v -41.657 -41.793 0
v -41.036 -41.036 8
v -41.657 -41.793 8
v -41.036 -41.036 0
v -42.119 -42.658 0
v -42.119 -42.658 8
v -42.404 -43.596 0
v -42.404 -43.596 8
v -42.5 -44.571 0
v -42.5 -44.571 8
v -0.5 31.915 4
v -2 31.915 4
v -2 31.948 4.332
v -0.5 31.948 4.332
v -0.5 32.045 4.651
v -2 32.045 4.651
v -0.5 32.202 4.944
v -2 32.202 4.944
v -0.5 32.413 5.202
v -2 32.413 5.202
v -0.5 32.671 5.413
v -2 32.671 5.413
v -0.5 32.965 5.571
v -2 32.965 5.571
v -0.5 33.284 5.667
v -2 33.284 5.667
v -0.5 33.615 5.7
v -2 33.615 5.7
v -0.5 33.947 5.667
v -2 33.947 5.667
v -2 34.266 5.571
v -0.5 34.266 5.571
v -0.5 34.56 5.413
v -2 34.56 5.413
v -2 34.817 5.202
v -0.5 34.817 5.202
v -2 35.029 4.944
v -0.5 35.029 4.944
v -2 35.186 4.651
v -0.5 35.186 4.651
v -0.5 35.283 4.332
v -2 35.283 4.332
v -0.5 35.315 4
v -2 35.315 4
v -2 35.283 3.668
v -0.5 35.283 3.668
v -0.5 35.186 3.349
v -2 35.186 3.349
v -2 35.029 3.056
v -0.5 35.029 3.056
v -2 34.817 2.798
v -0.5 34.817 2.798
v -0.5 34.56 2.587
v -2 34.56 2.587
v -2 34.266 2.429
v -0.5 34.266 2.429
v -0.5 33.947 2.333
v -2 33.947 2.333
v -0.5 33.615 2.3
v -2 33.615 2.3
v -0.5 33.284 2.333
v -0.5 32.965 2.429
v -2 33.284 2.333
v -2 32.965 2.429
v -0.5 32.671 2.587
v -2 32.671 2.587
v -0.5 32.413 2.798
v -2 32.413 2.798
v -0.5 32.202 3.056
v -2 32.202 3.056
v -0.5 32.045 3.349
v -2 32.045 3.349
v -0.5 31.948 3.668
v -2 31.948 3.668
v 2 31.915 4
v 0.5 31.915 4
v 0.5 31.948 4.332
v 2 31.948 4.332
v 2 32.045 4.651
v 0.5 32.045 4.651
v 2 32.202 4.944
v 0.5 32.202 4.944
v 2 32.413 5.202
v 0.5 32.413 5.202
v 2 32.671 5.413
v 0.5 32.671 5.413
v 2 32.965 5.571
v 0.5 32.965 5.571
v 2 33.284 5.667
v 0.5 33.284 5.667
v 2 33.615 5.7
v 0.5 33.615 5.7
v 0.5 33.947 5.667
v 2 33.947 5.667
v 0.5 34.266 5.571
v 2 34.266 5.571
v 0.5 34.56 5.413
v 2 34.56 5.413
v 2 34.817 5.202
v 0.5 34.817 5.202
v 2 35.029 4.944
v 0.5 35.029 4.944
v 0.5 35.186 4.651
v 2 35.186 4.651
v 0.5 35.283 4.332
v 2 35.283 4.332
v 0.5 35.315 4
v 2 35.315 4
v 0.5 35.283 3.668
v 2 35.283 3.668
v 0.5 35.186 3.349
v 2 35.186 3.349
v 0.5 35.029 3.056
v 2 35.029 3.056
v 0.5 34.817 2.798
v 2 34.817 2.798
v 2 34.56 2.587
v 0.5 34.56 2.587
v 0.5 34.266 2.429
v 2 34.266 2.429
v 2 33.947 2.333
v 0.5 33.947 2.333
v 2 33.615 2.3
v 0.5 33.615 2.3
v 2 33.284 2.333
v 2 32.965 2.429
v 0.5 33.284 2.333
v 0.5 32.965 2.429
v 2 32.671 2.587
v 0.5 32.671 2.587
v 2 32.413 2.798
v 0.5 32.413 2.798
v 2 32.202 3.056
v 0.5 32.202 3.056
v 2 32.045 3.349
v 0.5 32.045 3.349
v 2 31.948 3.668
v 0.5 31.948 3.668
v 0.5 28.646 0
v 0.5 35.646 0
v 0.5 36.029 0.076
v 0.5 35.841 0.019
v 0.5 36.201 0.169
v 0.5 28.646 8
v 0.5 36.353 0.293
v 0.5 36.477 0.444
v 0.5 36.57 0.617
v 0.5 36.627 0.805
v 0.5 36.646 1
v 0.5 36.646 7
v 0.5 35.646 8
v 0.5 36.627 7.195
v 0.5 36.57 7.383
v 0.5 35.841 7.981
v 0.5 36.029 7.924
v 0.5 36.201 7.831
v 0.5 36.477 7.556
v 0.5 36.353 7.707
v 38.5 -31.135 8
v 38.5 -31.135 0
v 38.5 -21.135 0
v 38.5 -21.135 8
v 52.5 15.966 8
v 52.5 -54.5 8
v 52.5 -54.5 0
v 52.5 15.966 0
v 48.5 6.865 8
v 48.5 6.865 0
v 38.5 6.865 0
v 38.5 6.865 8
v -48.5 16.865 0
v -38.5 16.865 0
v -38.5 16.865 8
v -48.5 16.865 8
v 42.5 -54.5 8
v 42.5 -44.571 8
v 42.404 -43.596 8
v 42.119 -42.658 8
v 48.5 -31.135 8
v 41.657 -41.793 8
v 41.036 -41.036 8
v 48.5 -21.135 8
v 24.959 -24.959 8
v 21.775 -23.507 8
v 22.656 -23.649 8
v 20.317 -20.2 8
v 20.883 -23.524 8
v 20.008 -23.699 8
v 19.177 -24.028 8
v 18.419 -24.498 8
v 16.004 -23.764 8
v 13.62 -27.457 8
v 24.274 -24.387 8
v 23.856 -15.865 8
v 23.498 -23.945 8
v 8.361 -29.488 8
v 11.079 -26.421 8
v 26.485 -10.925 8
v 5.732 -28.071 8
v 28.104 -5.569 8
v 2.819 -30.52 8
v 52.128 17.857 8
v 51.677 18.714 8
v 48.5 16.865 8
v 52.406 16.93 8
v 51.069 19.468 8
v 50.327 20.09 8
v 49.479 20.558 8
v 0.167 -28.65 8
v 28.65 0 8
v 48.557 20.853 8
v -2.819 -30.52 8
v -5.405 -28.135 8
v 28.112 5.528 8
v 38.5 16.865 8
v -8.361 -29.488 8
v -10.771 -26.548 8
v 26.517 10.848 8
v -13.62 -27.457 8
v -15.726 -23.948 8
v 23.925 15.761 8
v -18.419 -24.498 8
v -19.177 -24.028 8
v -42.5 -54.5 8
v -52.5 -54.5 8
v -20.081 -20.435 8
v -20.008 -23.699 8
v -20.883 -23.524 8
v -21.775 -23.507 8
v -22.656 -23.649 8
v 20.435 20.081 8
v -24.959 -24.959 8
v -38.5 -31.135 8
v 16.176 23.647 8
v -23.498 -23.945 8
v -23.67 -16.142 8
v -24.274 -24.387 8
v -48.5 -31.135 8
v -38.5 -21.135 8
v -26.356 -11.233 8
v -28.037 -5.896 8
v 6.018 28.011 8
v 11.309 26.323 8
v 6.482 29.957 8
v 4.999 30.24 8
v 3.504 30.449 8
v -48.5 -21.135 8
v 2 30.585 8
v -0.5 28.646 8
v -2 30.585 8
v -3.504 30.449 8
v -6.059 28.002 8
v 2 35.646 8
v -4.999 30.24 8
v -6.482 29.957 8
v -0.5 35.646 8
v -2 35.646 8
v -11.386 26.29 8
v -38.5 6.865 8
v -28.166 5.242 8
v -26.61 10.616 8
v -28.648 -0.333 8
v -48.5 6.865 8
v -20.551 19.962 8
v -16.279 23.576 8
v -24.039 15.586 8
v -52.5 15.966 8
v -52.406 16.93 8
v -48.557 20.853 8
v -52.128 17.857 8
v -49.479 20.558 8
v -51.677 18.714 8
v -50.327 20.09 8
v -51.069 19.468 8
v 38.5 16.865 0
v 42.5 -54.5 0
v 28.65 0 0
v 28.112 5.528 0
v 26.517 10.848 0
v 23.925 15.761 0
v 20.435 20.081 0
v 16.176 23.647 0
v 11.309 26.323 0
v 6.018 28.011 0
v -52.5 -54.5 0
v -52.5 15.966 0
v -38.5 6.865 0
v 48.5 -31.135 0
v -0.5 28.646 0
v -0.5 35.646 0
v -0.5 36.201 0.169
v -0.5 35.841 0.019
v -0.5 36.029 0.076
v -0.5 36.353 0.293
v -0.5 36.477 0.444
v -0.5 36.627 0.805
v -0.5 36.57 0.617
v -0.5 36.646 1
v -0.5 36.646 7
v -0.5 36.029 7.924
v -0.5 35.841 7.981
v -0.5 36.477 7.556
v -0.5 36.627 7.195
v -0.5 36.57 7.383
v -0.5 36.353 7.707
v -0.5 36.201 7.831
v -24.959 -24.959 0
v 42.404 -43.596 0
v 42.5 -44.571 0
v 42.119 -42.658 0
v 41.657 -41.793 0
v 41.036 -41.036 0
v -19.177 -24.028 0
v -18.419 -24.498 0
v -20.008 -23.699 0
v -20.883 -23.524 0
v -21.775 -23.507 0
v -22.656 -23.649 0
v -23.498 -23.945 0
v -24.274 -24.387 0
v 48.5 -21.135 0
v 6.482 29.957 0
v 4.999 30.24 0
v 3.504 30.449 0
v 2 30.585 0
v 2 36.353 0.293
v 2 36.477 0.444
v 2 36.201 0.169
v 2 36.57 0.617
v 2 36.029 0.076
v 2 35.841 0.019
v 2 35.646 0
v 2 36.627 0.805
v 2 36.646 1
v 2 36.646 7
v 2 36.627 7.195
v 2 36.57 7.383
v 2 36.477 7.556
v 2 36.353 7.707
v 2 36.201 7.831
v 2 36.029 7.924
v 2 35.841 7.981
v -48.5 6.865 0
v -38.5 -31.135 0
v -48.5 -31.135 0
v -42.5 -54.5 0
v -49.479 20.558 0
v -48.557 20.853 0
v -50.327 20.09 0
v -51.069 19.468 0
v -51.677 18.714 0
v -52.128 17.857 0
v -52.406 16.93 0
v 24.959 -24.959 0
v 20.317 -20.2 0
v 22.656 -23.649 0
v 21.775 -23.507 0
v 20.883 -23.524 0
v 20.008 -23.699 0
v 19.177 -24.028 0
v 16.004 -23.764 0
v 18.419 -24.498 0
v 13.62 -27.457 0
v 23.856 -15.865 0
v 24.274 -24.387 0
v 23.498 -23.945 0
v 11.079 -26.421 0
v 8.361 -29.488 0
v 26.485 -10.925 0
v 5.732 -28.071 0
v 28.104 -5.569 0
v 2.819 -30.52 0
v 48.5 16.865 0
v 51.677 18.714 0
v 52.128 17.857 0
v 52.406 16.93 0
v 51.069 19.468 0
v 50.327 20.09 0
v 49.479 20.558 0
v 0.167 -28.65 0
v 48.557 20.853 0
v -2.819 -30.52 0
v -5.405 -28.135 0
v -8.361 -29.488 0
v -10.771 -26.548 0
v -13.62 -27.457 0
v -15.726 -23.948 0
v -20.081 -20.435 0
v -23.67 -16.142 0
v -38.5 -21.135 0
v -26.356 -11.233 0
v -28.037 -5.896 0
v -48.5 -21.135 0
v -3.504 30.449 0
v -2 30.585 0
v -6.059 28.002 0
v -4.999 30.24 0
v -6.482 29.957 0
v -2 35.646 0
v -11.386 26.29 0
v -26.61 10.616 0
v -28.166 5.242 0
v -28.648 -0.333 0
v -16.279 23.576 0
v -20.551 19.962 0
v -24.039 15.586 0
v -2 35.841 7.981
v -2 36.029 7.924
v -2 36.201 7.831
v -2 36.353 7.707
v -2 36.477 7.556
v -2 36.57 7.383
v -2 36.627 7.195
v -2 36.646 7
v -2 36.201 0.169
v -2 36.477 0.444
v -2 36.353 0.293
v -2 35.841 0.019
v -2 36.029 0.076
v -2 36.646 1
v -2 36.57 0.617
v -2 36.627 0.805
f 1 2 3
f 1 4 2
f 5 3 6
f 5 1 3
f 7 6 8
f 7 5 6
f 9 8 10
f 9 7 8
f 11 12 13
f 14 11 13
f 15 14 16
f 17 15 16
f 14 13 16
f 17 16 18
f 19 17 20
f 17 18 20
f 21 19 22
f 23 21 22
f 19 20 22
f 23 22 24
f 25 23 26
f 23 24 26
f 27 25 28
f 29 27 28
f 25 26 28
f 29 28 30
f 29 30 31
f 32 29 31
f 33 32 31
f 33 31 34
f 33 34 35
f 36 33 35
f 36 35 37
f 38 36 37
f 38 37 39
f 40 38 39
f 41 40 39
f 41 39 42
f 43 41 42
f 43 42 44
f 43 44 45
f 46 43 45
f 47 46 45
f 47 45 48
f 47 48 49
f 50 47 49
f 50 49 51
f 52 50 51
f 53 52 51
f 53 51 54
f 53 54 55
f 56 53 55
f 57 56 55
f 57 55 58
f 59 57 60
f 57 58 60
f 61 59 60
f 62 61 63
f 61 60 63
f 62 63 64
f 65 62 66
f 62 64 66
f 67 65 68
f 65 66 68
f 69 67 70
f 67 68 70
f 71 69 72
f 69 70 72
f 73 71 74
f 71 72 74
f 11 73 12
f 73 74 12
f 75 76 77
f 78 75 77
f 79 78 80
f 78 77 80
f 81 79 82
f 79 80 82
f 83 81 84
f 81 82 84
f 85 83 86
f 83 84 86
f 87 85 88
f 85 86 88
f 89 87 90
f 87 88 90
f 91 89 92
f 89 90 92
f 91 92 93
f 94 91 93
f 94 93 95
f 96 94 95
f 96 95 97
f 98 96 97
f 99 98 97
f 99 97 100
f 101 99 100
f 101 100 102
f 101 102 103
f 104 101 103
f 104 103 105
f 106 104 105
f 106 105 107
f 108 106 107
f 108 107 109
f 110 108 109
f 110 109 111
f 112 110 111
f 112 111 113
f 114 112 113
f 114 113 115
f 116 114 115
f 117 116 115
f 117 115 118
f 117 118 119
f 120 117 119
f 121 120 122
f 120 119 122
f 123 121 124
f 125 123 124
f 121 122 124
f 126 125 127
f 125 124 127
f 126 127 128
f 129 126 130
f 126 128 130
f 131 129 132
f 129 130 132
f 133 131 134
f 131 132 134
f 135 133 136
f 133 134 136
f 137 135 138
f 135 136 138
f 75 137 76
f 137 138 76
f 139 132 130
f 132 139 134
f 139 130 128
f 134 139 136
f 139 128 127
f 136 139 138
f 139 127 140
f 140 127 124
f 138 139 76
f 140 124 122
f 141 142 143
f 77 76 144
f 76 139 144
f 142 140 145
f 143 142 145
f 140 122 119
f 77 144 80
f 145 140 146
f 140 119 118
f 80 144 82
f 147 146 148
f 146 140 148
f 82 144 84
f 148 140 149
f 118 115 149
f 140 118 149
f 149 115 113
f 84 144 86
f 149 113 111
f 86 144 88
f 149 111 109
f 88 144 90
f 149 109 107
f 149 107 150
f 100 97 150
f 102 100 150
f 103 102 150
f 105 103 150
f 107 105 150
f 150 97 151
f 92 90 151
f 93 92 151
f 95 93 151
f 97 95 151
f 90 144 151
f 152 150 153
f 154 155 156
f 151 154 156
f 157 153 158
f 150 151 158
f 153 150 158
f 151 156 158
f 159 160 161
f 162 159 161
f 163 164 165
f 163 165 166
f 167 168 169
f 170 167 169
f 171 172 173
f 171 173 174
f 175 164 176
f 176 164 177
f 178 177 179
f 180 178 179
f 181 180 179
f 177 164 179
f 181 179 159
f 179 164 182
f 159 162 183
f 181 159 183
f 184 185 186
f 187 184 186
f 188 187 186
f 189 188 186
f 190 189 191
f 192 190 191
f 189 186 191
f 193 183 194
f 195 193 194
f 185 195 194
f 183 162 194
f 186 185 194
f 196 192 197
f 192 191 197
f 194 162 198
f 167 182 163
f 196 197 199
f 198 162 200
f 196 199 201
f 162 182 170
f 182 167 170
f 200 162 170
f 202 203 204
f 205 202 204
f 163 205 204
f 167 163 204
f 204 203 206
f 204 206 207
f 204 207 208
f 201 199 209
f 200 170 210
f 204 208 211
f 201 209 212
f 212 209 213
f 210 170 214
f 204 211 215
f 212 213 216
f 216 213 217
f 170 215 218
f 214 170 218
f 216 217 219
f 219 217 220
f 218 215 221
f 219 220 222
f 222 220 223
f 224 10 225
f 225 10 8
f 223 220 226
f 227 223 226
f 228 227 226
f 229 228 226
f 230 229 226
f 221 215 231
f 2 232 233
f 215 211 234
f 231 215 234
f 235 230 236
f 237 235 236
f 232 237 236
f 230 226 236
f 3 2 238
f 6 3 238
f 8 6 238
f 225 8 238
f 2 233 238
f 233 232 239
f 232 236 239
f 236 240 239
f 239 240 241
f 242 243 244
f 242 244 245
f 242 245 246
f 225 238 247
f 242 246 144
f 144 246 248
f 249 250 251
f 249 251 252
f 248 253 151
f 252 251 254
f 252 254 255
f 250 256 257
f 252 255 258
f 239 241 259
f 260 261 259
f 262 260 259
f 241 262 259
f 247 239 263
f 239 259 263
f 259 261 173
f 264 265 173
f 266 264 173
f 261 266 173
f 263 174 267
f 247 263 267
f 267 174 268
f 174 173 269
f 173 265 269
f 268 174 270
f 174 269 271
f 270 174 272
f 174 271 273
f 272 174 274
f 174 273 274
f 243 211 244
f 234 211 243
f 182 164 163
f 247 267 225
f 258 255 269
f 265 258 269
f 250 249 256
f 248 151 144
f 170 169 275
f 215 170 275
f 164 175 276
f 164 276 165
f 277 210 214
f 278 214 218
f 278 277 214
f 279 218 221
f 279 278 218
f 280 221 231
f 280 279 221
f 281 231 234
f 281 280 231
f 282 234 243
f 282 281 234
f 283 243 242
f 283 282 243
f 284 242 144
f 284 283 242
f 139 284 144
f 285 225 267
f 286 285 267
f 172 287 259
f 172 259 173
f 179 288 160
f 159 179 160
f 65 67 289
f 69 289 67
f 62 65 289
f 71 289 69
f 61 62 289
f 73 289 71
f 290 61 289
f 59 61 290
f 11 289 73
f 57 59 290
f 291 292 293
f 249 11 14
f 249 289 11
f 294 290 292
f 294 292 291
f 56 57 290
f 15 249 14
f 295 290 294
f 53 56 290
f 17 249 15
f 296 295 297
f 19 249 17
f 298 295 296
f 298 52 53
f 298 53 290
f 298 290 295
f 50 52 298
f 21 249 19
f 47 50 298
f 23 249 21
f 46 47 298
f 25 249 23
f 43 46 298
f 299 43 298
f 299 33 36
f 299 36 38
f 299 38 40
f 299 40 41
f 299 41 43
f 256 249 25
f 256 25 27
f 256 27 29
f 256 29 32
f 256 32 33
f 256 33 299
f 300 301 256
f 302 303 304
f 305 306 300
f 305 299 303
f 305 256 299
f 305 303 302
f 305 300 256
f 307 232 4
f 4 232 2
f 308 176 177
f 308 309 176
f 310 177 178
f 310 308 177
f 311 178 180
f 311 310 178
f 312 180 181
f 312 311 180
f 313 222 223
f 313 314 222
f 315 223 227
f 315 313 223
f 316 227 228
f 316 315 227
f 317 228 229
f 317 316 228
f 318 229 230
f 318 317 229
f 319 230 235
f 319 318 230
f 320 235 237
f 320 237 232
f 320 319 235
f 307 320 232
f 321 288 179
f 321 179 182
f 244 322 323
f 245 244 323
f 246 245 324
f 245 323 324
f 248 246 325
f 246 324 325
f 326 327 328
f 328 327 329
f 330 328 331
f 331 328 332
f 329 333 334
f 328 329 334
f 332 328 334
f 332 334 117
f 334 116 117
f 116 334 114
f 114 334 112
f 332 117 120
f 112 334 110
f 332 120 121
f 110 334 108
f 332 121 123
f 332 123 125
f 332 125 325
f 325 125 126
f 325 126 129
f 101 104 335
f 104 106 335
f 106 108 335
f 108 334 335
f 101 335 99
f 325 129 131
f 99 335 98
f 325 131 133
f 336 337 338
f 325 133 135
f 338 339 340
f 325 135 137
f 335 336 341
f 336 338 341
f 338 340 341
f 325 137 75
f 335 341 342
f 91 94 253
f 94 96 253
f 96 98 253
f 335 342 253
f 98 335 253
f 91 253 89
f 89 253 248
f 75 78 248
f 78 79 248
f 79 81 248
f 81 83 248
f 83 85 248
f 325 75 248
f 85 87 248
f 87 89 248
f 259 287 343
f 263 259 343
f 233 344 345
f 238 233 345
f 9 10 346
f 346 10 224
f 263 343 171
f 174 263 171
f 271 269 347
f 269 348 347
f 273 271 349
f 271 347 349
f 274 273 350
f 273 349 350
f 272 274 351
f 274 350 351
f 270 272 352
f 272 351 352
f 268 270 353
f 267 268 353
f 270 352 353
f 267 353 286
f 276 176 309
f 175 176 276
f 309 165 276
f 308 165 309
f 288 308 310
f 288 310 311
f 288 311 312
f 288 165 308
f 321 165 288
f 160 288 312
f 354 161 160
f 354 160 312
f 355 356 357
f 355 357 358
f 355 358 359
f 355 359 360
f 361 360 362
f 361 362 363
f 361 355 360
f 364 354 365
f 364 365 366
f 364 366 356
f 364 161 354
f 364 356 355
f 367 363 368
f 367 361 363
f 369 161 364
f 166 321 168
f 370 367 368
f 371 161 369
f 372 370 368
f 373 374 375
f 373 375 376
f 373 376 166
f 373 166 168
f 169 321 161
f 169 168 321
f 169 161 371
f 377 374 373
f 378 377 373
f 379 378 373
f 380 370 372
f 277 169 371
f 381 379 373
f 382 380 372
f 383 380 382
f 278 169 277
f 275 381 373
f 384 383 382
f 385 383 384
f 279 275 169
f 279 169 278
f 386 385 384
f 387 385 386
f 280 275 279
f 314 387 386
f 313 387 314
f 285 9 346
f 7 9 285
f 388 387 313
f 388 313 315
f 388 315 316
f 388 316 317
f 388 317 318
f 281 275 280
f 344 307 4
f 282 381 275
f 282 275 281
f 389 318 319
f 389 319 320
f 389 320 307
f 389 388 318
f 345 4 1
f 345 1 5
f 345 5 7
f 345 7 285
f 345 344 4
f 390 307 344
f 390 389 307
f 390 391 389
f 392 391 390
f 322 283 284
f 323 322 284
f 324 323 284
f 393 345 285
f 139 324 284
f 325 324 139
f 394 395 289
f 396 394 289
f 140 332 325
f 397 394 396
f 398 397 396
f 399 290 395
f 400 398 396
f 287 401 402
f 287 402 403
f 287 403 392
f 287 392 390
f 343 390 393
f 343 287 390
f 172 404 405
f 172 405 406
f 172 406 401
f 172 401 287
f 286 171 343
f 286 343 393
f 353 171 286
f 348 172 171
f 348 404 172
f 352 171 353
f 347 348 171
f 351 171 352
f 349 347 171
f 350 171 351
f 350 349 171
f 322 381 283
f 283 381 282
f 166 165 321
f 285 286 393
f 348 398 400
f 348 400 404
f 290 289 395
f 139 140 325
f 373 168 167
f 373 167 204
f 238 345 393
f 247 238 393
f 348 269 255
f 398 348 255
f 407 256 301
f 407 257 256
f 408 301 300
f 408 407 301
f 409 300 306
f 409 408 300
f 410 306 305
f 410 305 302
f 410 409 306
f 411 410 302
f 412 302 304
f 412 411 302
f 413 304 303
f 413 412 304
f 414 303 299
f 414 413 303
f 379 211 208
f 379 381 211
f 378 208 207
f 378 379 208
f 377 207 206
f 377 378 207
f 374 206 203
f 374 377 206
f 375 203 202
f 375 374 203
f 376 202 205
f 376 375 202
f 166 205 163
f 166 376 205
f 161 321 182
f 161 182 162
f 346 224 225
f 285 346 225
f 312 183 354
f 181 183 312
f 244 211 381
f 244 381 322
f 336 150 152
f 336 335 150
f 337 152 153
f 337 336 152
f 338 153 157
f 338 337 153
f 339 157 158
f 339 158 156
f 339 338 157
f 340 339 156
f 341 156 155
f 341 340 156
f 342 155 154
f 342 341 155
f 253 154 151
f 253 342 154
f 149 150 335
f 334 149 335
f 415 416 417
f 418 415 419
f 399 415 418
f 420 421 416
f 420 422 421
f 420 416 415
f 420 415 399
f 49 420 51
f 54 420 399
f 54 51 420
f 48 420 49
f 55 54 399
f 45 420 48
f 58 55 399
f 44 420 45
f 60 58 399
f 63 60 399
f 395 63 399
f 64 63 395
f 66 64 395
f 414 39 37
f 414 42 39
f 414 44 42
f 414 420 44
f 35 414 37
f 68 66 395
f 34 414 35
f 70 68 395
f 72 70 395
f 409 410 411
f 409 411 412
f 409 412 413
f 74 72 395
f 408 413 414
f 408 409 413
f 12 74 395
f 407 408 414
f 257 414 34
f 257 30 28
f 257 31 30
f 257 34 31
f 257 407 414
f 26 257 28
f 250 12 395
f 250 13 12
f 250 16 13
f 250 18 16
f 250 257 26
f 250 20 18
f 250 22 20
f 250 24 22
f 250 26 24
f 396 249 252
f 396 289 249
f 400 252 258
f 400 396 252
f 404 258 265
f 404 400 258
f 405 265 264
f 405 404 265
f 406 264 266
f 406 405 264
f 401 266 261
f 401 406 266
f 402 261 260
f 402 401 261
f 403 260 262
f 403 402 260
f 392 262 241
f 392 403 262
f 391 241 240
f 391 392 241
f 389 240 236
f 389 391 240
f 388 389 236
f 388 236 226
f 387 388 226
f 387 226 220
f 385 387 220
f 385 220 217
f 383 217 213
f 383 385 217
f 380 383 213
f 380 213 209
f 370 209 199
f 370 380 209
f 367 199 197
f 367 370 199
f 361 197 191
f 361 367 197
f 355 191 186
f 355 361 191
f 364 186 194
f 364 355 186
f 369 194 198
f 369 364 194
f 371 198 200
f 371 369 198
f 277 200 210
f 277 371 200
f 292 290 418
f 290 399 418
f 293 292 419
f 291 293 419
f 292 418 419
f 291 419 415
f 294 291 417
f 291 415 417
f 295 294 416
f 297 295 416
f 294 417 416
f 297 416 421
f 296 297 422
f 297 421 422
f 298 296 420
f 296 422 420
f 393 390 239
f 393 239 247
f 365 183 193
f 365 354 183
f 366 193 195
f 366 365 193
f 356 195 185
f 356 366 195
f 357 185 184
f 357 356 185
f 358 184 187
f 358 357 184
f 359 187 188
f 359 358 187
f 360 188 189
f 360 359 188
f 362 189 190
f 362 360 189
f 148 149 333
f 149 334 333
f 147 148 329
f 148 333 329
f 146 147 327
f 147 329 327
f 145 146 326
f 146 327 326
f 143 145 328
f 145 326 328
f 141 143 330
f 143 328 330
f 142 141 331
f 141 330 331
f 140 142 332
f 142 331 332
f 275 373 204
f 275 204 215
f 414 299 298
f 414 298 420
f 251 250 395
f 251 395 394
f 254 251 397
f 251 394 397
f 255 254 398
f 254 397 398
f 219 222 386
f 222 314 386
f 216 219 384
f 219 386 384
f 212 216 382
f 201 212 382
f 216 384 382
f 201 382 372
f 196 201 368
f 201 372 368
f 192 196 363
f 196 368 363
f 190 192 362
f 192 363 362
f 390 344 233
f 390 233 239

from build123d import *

# Parameters (mm, degrees)
SKIZZE1_R                       = 30.65
SKIZZE1_R_2                     = 28.65
AUFSATZ_LINEAR_AUSTRAGEN1_DEPTH = 8
AUFSATZ_LINEAR_AUSTRAGEN2_DEPTH = 8
SKIZZE3_W                       = 1
SKIZZE3_H                       = 2.855309686
SCHNITT_LINEAR_AUSTRAGEN1_DEPTH = 10
AUFSATZ_LINEAR_AUSTRAGEN3_DEPTH = 8
SKIZZE5_R                       = 1.7
SCHNITT_LINEAR_AUSTRAGEN2_DEPTH = 8
VERRUNDUNG2_R                   = 1
SKIZZE7_W                       = 10
SKIZZE7_H                       = 10
SCHNITT_LINEAR_AUSTRAGEN4_DEPTH = 10
VERRUNDUNG3_R                   = 5


with BuildPart() as part:
    # Skizze1 → Aufsatz-Linear austragen1 (new body)
    with BuildSketch(Plane.XY):
        Circle(SKIZZE1_R)
        Circle(SKIZZE1_R_2, mode=Mode.SUBTRACT)
    extrude(amount=AUFSATZ_LINEAR_AUSTRAGEN1_DEPTH)

    # Skizze2 → Aufsatz-Linear austragen2 (add)
    with BuildSketch(Plane.XY.offset(8)):
        with BuildLine():
            Line((42.5, -42.5), (42.5, -54.5))
            Line((42.5, -54.5), (52.5, -54.5))
            Line((52.5, -54.5), (52.5, 20))
            Line((52.5, 20), (6.481641536, 29.956815969))
            Line((6.481641536, 29.956815969), (6.460494255, 29.859077581))
            ThreePointArc((6.460494255, 29.859077581), (29.307694933, 8.623312455), (21.602112165, -21.602112165))
            Line((21.602112165, -21.602112165), (21.672822843, -21.672822843))
            Line((21.672822843, -21.672822843), (42.5, -42.5))
        make_face()
        with BuildLine():
            Line((-21.672822843, -21.672822843), (-42.5, -42.5))
            Line((-42.5, -42.5), (-42.5, -54.5))
            Line((-42.5, -54.5), (-52.5, -54.5))
            Line((-52.5, -54.5), (-52.5, 20))
            Line((-52.5, 20), (-6.481641536, 29.956815969))
            Line((-6.481641536, 29.956815969), (-6.460494255, 29.859077581))
            ThreePointArc((-6.460494255, 29.859077581), (-29.307694933, 8.623312455), (-21.602112165, -21.602112165))
            Line((-21.602112165, -21.602112165), (-21.672822843, -21.672822843))
        make_face()
    extrude(amount=-AUFSATZ_LINEAR_AUSTRAGEN2_DEPTH)

    # Skizze3 → Schnitt-Linear austragen1 (cut)
    with BuildSketch(Plane.XY.offset(8)):
        with Locations((0, 29.34103969)):
            Rectangle(SKIZZE3_W, SKIZZE3_H)
    extrude(amount=-SCHNITT_LINEAR_AUSTRAGEN1_DEPTH, mode=Mode.SUBTRACT)

    # Skizze4 → Aufsatz-Linear austragen3 (add)
    with BuildSketch(Plane.XY.offset(8)):
        Polygon((0.5, 30.645921425), (0.5, 36.645921425), (2, 36.645921425), (2, 29.02715443), align=None)
        Polygon((-2, 29.02715443), (-0.5, 30.645921425), (-0.5, 36.645921425), (-2, 36.645921425), align=None)
    extrude(amount=-AUFSATZ_LINEAR_AUSTRAGEN3_DEPTH)

    # Skizze5 → Schnitt-Linear austragen2 (cut)
    with BuildSketch(Plane.ZY.offset(2)):
        with Locations(Location((4, 33.615299481, 0), (0, 0, 270))):
            Circle(SKIZZE5_R)
    extrude(amount=-SCHNITT_LINEAR_AUSTRAGEN2_DEPTH, mode=Mode.SUBTRACT)

    # Verrundung2
    verrundung2_edges = [part.edges().sort_by_distance(p)[0] for p in [
        (-1.25, 36.645921425, 8),
        (-1.25, 36.645921425, 0),
        (1.25, 36.645921425, 8),
        (1.25, 36.645921425, 0),
    ]]
    fillet(verrundung2_edges, radius=VERRUNDUNG2_R)

    # Skizze7 → Schnitt-Linear austragen4 (cut)
    with BuildSketch(Plane(origin=(0, 0, 0), x_dir=(-1, 0, 0), z_dir=(0, 0, -1))):
        with Locations((-43.5, 11.86546468)):
            Rectangle(SKIZZE7_W, SKIZZE7_H)
        with Locations((-43.5, -26.13453532)):
            Rectangle(SKIZZE7_W, SKIZZE7_H)
        with Locations((43.5, -26.13453532)):
            Rectangle(SKIZZE7_W, SKIZZE7_H)
        with Locations((43.5, 11.86546468)):
            Rectangle(SKIZZE7_W, SKIZZE7_H)
    extrude(amount=-SCHNITT_LINEAR_AUSTRAGEN4_DEPTH, mode=Mode.SUBTRACT)

    # Verrundung3
    verrundung3_edges = [part.edges().sort_by_distance(p)[0] for p in [
        (-21.672822843, -21.672822843, 4),
        (-42.5, -42.5, 4),
        (-52.5, 20, 4),
        (21.672822843, -21.672822843, 4),
        (42.5, -42.5, 4),
        (52.5, 20, 4),
    ]]
    fillet(verrundung3_edges, radius=VERRUNDUNG3_R)


solid = part.part
